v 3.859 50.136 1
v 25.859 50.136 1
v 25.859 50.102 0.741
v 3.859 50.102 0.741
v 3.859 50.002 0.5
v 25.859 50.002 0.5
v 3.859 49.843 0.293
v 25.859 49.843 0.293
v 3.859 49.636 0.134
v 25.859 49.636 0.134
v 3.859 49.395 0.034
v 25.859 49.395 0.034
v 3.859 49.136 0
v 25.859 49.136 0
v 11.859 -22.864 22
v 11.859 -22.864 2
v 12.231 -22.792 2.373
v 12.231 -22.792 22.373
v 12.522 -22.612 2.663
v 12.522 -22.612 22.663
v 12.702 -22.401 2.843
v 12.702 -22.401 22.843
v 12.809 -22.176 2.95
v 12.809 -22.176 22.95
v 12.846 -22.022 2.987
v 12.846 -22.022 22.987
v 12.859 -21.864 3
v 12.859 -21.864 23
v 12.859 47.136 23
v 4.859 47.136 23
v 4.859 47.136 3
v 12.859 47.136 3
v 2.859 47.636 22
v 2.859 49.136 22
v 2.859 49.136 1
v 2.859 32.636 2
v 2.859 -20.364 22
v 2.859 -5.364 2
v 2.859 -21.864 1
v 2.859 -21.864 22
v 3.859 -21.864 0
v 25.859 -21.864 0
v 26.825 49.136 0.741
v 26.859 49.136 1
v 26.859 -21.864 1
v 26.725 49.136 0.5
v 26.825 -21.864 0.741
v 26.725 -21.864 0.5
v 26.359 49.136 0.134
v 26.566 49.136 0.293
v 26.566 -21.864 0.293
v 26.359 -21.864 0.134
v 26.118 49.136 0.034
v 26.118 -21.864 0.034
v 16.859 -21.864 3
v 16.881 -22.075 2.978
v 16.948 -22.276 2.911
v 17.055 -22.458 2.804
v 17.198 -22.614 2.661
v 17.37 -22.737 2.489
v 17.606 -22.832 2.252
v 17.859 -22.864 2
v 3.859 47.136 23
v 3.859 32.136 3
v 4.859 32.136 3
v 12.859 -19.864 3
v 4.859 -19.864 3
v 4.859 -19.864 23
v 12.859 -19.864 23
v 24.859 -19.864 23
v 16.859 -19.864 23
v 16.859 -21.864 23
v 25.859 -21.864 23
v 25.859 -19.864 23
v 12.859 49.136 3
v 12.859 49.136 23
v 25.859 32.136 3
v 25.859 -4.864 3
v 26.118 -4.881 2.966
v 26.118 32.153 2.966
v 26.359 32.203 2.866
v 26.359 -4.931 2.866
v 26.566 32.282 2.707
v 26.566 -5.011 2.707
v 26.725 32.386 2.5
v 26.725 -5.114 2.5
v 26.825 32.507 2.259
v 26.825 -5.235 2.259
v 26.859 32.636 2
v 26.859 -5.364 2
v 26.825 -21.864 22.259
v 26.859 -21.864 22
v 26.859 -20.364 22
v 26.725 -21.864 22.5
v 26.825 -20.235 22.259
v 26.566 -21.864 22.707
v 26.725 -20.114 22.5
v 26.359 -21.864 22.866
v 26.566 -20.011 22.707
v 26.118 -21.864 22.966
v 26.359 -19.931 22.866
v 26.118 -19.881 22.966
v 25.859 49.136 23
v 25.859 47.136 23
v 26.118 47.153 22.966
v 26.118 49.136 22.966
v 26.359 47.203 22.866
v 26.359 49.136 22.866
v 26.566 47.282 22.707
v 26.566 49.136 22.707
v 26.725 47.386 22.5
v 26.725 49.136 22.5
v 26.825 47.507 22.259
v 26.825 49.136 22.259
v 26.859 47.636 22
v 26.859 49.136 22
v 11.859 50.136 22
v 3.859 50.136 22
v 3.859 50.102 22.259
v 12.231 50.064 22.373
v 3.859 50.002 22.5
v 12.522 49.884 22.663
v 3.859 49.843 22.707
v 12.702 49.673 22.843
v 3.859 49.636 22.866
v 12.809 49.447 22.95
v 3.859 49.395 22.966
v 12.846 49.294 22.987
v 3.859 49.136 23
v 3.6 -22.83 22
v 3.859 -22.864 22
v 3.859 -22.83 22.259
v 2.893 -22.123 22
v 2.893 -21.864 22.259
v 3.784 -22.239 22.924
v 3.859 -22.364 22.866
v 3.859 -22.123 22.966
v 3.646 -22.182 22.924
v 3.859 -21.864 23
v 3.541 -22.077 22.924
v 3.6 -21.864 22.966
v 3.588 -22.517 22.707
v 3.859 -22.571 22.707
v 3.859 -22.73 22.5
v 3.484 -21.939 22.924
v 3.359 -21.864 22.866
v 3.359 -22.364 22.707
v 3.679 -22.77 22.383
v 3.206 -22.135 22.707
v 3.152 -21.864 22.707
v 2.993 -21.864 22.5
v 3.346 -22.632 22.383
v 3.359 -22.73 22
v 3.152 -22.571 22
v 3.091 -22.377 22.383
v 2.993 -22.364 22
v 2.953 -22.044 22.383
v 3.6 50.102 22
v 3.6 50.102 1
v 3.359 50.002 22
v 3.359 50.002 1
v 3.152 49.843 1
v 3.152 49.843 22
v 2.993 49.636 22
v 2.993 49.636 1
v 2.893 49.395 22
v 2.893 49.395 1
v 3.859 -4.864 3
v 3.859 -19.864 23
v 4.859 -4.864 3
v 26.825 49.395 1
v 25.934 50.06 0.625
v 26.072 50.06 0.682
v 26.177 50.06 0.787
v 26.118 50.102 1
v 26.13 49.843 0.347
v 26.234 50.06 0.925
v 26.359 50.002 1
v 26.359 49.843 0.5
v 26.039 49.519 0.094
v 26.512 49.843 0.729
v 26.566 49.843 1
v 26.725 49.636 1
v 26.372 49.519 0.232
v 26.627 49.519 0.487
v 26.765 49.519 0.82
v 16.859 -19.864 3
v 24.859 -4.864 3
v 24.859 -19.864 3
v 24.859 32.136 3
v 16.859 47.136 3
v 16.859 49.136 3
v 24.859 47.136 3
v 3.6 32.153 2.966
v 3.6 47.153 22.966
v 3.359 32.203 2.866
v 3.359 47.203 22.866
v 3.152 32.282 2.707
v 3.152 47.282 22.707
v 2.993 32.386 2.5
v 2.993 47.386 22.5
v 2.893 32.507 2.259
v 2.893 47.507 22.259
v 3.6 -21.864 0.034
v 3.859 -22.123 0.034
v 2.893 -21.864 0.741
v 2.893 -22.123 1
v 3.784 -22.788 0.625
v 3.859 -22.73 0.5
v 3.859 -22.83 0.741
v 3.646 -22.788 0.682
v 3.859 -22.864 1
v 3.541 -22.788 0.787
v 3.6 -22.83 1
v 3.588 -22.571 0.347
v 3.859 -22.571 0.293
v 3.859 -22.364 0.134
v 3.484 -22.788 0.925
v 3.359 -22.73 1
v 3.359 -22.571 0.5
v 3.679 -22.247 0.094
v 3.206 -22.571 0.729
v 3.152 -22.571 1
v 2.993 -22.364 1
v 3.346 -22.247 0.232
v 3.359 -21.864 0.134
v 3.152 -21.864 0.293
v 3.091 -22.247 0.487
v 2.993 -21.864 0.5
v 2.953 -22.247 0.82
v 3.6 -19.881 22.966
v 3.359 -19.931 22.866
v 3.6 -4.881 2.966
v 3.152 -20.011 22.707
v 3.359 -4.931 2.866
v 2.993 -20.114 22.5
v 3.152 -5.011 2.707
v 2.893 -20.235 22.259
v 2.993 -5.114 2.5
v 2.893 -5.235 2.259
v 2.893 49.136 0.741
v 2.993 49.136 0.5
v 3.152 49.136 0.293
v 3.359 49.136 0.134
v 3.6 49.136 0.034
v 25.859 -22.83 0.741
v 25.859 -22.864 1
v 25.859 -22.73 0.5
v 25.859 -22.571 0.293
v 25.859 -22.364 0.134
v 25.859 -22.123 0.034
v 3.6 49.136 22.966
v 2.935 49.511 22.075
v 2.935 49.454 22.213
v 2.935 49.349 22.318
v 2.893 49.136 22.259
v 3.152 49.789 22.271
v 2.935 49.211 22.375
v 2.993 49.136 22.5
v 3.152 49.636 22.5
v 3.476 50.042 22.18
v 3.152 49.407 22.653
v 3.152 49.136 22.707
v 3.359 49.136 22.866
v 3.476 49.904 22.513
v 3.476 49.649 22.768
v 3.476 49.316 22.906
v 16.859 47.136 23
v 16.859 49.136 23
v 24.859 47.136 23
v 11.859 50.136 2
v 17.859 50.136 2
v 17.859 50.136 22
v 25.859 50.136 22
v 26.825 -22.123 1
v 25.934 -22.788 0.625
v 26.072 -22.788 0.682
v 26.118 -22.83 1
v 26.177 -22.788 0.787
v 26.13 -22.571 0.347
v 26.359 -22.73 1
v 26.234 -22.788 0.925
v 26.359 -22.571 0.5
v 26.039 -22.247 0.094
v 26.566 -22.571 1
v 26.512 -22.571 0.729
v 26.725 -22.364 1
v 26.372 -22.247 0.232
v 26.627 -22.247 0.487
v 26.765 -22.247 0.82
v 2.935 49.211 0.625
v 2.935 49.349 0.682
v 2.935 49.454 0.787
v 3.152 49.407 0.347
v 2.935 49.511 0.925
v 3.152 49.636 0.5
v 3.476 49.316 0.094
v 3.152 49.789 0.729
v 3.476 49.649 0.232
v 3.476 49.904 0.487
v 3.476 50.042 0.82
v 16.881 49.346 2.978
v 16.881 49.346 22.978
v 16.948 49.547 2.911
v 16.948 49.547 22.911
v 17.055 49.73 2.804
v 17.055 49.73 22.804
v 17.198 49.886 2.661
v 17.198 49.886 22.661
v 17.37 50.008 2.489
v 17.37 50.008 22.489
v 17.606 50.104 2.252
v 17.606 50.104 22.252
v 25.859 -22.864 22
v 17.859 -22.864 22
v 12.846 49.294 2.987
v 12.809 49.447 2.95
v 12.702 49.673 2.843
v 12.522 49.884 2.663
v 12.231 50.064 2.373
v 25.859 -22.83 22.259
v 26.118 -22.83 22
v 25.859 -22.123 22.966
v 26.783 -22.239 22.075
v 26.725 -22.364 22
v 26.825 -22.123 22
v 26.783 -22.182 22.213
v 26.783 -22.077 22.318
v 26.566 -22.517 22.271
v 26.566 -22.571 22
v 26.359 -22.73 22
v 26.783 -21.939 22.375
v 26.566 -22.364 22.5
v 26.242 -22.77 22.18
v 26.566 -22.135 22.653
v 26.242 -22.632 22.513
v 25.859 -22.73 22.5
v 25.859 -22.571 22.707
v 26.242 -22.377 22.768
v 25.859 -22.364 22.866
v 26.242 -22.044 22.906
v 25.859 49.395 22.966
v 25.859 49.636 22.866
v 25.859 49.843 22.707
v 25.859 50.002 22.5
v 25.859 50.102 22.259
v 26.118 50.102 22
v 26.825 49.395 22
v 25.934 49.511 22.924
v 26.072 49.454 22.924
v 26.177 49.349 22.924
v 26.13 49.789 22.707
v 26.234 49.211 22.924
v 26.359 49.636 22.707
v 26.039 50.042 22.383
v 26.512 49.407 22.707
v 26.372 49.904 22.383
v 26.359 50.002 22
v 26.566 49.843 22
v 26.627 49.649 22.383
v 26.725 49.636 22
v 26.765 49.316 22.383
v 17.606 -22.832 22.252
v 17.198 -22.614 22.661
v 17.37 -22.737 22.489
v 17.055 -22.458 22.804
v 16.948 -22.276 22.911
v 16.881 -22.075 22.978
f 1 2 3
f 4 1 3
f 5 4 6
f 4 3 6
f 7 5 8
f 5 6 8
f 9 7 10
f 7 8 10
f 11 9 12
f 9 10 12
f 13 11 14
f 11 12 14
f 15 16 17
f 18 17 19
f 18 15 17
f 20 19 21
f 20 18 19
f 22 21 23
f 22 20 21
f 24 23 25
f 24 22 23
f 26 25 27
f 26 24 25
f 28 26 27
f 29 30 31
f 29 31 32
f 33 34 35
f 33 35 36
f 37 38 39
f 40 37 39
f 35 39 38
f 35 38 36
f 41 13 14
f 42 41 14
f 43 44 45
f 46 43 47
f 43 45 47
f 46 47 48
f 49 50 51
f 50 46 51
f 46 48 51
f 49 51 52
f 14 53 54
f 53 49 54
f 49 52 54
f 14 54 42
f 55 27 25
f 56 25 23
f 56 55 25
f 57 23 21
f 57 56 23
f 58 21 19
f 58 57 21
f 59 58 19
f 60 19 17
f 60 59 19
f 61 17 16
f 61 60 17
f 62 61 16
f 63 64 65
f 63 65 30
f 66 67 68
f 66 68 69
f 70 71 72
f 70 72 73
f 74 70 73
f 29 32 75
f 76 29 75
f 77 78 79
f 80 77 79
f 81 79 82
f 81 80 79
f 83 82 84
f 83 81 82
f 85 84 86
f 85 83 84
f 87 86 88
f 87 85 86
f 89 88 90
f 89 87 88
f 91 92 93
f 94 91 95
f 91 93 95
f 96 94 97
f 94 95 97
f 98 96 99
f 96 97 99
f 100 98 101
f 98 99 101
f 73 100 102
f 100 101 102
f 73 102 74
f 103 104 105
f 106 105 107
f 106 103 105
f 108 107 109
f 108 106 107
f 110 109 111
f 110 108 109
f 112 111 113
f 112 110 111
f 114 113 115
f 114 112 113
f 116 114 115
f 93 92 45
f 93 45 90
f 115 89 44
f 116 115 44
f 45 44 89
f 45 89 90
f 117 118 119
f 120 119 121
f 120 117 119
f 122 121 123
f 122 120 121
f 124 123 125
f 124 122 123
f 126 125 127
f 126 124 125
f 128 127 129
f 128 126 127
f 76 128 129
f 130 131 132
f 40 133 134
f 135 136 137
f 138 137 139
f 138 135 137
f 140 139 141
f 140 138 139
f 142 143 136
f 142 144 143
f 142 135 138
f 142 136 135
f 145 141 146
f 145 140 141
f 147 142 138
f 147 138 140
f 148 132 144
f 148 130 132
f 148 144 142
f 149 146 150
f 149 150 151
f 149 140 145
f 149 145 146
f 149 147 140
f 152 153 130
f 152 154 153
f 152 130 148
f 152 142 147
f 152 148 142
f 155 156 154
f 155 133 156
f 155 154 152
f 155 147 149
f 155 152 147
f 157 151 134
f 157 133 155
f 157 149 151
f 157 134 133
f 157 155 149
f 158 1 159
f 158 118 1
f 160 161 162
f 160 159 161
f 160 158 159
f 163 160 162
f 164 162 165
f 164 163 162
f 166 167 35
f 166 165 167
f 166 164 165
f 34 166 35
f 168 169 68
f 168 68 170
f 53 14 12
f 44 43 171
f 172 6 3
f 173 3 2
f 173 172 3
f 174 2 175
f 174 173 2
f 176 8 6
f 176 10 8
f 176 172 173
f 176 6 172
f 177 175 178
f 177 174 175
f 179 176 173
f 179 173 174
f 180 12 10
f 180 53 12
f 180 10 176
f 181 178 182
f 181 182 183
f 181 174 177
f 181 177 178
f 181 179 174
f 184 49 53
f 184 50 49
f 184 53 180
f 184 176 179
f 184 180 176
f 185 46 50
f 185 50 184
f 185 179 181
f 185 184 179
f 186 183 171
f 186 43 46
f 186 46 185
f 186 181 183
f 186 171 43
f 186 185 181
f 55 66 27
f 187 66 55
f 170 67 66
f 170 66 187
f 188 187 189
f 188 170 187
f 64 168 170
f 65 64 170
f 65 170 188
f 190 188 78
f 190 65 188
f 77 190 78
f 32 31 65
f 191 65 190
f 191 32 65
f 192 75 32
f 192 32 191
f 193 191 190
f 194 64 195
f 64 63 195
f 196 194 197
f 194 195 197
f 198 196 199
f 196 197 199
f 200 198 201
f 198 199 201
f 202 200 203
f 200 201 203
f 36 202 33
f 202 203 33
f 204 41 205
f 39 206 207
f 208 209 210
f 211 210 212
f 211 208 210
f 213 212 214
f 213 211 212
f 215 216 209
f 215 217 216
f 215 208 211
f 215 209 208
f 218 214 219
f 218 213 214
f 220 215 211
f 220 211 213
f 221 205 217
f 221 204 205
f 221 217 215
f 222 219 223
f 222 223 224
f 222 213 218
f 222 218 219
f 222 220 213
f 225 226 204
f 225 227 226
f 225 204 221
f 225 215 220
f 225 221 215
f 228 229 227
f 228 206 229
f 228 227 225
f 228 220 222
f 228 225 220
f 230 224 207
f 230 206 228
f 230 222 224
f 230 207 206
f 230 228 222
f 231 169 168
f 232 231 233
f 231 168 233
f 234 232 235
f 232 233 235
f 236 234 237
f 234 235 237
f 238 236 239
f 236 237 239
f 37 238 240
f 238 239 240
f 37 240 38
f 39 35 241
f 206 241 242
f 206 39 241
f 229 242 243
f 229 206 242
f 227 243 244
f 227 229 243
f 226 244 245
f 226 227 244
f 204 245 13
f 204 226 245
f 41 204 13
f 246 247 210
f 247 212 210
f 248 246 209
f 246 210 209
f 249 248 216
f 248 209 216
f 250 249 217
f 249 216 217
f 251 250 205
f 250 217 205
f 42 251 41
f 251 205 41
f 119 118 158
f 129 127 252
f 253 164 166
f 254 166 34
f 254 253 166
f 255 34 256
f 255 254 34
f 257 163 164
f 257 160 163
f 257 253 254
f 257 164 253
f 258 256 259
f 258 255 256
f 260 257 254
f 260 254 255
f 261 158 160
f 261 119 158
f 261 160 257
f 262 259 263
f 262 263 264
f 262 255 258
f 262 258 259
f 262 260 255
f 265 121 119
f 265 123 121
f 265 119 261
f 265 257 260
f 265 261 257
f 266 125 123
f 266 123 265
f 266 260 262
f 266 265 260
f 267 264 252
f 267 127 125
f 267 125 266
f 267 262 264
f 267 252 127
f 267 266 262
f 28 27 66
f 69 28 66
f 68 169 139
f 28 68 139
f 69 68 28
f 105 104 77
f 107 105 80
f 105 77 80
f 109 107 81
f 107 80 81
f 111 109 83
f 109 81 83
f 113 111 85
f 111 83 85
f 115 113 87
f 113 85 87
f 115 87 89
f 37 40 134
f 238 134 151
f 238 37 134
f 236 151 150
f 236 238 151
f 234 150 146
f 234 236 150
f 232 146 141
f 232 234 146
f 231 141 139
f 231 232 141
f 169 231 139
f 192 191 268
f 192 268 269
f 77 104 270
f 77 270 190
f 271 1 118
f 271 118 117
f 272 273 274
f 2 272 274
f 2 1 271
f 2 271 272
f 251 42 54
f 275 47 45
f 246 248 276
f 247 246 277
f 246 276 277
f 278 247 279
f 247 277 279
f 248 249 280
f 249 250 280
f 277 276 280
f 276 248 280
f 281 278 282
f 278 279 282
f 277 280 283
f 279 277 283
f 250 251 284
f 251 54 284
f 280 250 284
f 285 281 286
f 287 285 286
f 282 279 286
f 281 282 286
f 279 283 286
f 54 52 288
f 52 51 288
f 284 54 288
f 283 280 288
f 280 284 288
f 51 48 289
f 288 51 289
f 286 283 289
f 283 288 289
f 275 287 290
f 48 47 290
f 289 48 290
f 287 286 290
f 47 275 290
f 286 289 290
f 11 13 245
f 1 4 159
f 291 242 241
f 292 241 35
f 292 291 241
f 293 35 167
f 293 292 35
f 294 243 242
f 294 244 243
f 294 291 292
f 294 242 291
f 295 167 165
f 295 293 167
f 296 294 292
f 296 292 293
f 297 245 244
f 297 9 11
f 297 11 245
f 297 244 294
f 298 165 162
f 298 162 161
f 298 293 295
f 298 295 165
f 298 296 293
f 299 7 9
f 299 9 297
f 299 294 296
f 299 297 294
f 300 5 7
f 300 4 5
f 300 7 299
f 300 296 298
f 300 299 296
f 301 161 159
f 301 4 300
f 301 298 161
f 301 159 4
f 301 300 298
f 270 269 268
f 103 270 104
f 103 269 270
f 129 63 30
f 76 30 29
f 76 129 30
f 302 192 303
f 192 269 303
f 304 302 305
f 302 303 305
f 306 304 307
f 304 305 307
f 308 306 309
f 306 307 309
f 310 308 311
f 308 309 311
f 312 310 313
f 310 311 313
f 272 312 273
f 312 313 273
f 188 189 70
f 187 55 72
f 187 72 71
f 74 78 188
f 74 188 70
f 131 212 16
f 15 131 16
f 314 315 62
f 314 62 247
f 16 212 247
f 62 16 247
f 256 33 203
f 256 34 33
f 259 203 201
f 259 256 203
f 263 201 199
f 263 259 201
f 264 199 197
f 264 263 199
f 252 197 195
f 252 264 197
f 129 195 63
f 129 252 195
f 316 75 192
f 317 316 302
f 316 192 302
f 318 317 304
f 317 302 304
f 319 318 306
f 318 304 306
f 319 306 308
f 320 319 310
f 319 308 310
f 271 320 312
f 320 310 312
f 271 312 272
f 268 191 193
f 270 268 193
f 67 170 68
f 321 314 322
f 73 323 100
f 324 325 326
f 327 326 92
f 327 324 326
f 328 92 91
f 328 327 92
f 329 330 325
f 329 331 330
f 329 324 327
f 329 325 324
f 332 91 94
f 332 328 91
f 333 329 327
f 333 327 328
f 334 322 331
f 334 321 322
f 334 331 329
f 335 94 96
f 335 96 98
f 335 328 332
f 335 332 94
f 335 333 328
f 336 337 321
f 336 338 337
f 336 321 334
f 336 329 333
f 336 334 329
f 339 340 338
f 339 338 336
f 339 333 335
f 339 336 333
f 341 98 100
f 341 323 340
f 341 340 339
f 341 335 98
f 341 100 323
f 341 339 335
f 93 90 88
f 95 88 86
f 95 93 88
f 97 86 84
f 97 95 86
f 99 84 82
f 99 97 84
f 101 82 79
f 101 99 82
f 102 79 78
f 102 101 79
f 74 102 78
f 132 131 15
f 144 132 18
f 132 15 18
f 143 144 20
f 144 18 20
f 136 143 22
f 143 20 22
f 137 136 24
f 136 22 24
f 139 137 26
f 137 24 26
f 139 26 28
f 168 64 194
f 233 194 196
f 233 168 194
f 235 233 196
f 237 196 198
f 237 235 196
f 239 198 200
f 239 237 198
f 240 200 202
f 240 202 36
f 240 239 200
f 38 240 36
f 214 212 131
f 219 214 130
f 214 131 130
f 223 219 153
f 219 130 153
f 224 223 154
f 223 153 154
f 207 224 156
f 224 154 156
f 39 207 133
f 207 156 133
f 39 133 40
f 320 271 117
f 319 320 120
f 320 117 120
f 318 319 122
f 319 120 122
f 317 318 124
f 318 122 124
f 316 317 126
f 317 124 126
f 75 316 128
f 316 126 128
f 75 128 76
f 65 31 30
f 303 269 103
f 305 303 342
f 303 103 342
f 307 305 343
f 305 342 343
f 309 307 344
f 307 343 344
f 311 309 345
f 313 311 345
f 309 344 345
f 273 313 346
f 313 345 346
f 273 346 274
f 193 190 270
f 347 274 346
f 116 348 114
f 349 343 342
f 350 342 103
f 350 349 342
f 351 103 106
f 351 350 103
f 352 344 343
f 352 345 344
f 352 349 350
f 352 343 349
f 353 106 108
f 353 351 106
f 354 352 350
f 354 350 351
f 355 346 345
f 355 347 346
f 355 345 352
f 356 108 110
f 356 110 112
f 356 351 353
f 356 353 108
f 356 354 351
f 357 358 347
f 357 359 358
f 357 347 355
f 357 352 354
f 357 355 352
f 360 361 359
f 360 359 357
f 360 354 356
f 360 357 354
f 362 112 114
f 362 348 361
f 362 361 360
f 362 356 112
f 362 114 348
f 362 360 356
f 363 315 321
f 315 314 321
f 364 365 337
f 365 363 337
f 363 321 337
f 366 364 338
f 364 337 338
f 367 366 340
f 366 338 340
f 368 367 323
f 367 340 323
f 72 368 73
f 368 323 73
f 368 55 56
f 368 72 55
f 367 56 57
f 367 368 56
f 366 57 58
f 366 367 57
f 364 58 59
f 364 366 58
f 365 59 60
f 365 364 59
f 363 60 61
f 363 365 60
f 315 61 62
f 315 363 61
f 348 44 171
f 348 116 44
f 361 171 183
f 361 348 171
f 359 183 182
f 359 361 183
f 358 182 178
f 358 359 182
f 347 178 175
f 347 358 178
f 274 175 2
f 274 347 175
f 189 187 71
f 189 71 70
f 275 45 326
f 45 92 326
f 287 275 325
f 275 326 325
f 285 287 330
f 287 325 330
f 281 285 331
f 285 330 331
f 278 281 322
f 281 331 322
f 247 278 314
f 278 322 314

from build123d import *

# Parameters (mm, degrees)
F0_W     = 10
F0_H     = 3
F1_DEPTH = 23
F0_W_2   = 4
F2_DEPTH = 3
F4_DEPTH = 2
F6_DEPTH = 2
F7_R     = 1


with BuildPart() as f1:
    # F0 (on Top) → F1 (new body)
    with BuildSketch(Plane.XY):
        with Locations((21.8589810431, 48.6359097213)):
            Rectangle(F0_W, F0_H)
    extrude(amount=F1_DEPTH)



with BuildPart() as f1b:
    # F0 (on Top) → F1, piece 2 (new body)
    with BuildSketch(Plane.XY):
        with Locations((7.8589810431, 48.6359097213)):
            Rectangle(F0_W, F0_H)
    extrude(amount=F1_DEPTH)


with BuildPart() as f1c:
    # F0 (on Top) → F1, piece 3 (new body)
    with BuildSketch(Plane.XY):
        with Locations((7.8589810431, -21.3640902787)):
            Rectangle(F0_W, F0_H)
    extrude(amount=F1_DEPTH)


with BuildPart() as f1d:
    # F0 (on Top) → F1, piece 4 (new body)
    with BuildSketch(Plane.XY):
        with Locations((21.8589810431, -21.3640902787)):
            Rectangle(F0_W, F0_H)
    extrude(amount=F1_DEPTH)


with BuildPart() as f1_1:
    add(f1.part)

    add(f1b.part)  # F2 merges F1b

    add(f1c.part)  # F2 merges F1c

    add(f1d.part)  # F2 merges F1d
    # F0 (on Top) → F2 (join)
    with BuildSketch(Plane.XY):
        Polygon((12.8589810431, 47.1359097213), (2.8589810431, 47.1359097213), (2.8589810431, -19.8640902787), (12.8589810431, -19.8640902787), (16.8589810431, -19.8640902787), (26.8589810431, -19.8640902787), (26.8589810431, 47.1359097213), (16.8589810431, 47.1359097213), align=None)
        with Locations((14.8589810431, -21.3640902787)):
            Rectangle(F0_W_2, F0_H)
        with Locations((14.8589810431, 48.6359097213)):
            Rectangle(F0_W_2, F0_H)
    extrude(amount=F2_DEPTH)

    # F3 (on face) → F4 (join)
    with BuildSketch(Plane(origin=(2.8589810431, 0, 0), x_dir=(0, -1, 0), z_dir=(-1, 0, 0))):
        Polygon((19.8640902787, 23), (4.8640902787, 3), (19.8640902787, 3), align=None)
        Polygon((-32.1359097213, 3), (-47.1359097213, 23), (-47.1359097213, 3), align=None)
    extrude(amount=-F4_DEPTH)

    # F5 (on face) → F6 (join)
    with BuildSketch(Plane.YZ.offset(26.8589810431)):
        Polygon((47.1359097213, 23), (32.1359097213, 3), (47.1359097213, 3), align=None)
        Polygon((-4.8640902787, 3), (-19.8640902787, 23), (-19.8640902787, 3), align=None)
    extrude(amount=-F6_DEPTH)

    # F7
    f7_edges = [f1_1.edges().sort_by_distance(p)[0] for p in [
        (26.858981, 13.63591, 0),
        (14.858981, 50.13591, 0),
        (2.858981, 13.63591, 0),
        (14.858981, -22.86409, 0),
        (16.858981, -22.86409, 13),
        (21.858981, -22.86409, 23),
        (26.858981, -22.86409, 11.5),
        (2.858981, -22.86409, 11.5),
        (7.858981, -22.86409, 23),
        (12.858981, -22.86409, 13),
        (14.858981, -22.86409, 3),
        (12.858981, 50.13591, 13),
        (7.858981, 50.13591, 23),
        (2.858981, 50.13591, 11.5),
        (26.858981, 50.13591, 11.5),
        (21.858981, 50.13591, 23),
        (16.858981, 50.13591, 13),
        (14.858981, 50.13591, 3),
        (2.858981, -21.36409, 23),
        (2.858981, 48.63591, 23),
        (2.858981, 39.63591, 13),
        (2.858981, 13.63591, 3),
        (2.858981, -12.36409, 13),
        (26.858981, -21.36409, 23),
        (26.858981, -12.36409, 13),
        (26.858981, 13.63591, 3),
        (26.858981, 39.63591, 13),
        (26.858981, 48.63591, 23),
    ]]
    fillet(f7_edges, radius=F7_R)


solid = f1_1.part
